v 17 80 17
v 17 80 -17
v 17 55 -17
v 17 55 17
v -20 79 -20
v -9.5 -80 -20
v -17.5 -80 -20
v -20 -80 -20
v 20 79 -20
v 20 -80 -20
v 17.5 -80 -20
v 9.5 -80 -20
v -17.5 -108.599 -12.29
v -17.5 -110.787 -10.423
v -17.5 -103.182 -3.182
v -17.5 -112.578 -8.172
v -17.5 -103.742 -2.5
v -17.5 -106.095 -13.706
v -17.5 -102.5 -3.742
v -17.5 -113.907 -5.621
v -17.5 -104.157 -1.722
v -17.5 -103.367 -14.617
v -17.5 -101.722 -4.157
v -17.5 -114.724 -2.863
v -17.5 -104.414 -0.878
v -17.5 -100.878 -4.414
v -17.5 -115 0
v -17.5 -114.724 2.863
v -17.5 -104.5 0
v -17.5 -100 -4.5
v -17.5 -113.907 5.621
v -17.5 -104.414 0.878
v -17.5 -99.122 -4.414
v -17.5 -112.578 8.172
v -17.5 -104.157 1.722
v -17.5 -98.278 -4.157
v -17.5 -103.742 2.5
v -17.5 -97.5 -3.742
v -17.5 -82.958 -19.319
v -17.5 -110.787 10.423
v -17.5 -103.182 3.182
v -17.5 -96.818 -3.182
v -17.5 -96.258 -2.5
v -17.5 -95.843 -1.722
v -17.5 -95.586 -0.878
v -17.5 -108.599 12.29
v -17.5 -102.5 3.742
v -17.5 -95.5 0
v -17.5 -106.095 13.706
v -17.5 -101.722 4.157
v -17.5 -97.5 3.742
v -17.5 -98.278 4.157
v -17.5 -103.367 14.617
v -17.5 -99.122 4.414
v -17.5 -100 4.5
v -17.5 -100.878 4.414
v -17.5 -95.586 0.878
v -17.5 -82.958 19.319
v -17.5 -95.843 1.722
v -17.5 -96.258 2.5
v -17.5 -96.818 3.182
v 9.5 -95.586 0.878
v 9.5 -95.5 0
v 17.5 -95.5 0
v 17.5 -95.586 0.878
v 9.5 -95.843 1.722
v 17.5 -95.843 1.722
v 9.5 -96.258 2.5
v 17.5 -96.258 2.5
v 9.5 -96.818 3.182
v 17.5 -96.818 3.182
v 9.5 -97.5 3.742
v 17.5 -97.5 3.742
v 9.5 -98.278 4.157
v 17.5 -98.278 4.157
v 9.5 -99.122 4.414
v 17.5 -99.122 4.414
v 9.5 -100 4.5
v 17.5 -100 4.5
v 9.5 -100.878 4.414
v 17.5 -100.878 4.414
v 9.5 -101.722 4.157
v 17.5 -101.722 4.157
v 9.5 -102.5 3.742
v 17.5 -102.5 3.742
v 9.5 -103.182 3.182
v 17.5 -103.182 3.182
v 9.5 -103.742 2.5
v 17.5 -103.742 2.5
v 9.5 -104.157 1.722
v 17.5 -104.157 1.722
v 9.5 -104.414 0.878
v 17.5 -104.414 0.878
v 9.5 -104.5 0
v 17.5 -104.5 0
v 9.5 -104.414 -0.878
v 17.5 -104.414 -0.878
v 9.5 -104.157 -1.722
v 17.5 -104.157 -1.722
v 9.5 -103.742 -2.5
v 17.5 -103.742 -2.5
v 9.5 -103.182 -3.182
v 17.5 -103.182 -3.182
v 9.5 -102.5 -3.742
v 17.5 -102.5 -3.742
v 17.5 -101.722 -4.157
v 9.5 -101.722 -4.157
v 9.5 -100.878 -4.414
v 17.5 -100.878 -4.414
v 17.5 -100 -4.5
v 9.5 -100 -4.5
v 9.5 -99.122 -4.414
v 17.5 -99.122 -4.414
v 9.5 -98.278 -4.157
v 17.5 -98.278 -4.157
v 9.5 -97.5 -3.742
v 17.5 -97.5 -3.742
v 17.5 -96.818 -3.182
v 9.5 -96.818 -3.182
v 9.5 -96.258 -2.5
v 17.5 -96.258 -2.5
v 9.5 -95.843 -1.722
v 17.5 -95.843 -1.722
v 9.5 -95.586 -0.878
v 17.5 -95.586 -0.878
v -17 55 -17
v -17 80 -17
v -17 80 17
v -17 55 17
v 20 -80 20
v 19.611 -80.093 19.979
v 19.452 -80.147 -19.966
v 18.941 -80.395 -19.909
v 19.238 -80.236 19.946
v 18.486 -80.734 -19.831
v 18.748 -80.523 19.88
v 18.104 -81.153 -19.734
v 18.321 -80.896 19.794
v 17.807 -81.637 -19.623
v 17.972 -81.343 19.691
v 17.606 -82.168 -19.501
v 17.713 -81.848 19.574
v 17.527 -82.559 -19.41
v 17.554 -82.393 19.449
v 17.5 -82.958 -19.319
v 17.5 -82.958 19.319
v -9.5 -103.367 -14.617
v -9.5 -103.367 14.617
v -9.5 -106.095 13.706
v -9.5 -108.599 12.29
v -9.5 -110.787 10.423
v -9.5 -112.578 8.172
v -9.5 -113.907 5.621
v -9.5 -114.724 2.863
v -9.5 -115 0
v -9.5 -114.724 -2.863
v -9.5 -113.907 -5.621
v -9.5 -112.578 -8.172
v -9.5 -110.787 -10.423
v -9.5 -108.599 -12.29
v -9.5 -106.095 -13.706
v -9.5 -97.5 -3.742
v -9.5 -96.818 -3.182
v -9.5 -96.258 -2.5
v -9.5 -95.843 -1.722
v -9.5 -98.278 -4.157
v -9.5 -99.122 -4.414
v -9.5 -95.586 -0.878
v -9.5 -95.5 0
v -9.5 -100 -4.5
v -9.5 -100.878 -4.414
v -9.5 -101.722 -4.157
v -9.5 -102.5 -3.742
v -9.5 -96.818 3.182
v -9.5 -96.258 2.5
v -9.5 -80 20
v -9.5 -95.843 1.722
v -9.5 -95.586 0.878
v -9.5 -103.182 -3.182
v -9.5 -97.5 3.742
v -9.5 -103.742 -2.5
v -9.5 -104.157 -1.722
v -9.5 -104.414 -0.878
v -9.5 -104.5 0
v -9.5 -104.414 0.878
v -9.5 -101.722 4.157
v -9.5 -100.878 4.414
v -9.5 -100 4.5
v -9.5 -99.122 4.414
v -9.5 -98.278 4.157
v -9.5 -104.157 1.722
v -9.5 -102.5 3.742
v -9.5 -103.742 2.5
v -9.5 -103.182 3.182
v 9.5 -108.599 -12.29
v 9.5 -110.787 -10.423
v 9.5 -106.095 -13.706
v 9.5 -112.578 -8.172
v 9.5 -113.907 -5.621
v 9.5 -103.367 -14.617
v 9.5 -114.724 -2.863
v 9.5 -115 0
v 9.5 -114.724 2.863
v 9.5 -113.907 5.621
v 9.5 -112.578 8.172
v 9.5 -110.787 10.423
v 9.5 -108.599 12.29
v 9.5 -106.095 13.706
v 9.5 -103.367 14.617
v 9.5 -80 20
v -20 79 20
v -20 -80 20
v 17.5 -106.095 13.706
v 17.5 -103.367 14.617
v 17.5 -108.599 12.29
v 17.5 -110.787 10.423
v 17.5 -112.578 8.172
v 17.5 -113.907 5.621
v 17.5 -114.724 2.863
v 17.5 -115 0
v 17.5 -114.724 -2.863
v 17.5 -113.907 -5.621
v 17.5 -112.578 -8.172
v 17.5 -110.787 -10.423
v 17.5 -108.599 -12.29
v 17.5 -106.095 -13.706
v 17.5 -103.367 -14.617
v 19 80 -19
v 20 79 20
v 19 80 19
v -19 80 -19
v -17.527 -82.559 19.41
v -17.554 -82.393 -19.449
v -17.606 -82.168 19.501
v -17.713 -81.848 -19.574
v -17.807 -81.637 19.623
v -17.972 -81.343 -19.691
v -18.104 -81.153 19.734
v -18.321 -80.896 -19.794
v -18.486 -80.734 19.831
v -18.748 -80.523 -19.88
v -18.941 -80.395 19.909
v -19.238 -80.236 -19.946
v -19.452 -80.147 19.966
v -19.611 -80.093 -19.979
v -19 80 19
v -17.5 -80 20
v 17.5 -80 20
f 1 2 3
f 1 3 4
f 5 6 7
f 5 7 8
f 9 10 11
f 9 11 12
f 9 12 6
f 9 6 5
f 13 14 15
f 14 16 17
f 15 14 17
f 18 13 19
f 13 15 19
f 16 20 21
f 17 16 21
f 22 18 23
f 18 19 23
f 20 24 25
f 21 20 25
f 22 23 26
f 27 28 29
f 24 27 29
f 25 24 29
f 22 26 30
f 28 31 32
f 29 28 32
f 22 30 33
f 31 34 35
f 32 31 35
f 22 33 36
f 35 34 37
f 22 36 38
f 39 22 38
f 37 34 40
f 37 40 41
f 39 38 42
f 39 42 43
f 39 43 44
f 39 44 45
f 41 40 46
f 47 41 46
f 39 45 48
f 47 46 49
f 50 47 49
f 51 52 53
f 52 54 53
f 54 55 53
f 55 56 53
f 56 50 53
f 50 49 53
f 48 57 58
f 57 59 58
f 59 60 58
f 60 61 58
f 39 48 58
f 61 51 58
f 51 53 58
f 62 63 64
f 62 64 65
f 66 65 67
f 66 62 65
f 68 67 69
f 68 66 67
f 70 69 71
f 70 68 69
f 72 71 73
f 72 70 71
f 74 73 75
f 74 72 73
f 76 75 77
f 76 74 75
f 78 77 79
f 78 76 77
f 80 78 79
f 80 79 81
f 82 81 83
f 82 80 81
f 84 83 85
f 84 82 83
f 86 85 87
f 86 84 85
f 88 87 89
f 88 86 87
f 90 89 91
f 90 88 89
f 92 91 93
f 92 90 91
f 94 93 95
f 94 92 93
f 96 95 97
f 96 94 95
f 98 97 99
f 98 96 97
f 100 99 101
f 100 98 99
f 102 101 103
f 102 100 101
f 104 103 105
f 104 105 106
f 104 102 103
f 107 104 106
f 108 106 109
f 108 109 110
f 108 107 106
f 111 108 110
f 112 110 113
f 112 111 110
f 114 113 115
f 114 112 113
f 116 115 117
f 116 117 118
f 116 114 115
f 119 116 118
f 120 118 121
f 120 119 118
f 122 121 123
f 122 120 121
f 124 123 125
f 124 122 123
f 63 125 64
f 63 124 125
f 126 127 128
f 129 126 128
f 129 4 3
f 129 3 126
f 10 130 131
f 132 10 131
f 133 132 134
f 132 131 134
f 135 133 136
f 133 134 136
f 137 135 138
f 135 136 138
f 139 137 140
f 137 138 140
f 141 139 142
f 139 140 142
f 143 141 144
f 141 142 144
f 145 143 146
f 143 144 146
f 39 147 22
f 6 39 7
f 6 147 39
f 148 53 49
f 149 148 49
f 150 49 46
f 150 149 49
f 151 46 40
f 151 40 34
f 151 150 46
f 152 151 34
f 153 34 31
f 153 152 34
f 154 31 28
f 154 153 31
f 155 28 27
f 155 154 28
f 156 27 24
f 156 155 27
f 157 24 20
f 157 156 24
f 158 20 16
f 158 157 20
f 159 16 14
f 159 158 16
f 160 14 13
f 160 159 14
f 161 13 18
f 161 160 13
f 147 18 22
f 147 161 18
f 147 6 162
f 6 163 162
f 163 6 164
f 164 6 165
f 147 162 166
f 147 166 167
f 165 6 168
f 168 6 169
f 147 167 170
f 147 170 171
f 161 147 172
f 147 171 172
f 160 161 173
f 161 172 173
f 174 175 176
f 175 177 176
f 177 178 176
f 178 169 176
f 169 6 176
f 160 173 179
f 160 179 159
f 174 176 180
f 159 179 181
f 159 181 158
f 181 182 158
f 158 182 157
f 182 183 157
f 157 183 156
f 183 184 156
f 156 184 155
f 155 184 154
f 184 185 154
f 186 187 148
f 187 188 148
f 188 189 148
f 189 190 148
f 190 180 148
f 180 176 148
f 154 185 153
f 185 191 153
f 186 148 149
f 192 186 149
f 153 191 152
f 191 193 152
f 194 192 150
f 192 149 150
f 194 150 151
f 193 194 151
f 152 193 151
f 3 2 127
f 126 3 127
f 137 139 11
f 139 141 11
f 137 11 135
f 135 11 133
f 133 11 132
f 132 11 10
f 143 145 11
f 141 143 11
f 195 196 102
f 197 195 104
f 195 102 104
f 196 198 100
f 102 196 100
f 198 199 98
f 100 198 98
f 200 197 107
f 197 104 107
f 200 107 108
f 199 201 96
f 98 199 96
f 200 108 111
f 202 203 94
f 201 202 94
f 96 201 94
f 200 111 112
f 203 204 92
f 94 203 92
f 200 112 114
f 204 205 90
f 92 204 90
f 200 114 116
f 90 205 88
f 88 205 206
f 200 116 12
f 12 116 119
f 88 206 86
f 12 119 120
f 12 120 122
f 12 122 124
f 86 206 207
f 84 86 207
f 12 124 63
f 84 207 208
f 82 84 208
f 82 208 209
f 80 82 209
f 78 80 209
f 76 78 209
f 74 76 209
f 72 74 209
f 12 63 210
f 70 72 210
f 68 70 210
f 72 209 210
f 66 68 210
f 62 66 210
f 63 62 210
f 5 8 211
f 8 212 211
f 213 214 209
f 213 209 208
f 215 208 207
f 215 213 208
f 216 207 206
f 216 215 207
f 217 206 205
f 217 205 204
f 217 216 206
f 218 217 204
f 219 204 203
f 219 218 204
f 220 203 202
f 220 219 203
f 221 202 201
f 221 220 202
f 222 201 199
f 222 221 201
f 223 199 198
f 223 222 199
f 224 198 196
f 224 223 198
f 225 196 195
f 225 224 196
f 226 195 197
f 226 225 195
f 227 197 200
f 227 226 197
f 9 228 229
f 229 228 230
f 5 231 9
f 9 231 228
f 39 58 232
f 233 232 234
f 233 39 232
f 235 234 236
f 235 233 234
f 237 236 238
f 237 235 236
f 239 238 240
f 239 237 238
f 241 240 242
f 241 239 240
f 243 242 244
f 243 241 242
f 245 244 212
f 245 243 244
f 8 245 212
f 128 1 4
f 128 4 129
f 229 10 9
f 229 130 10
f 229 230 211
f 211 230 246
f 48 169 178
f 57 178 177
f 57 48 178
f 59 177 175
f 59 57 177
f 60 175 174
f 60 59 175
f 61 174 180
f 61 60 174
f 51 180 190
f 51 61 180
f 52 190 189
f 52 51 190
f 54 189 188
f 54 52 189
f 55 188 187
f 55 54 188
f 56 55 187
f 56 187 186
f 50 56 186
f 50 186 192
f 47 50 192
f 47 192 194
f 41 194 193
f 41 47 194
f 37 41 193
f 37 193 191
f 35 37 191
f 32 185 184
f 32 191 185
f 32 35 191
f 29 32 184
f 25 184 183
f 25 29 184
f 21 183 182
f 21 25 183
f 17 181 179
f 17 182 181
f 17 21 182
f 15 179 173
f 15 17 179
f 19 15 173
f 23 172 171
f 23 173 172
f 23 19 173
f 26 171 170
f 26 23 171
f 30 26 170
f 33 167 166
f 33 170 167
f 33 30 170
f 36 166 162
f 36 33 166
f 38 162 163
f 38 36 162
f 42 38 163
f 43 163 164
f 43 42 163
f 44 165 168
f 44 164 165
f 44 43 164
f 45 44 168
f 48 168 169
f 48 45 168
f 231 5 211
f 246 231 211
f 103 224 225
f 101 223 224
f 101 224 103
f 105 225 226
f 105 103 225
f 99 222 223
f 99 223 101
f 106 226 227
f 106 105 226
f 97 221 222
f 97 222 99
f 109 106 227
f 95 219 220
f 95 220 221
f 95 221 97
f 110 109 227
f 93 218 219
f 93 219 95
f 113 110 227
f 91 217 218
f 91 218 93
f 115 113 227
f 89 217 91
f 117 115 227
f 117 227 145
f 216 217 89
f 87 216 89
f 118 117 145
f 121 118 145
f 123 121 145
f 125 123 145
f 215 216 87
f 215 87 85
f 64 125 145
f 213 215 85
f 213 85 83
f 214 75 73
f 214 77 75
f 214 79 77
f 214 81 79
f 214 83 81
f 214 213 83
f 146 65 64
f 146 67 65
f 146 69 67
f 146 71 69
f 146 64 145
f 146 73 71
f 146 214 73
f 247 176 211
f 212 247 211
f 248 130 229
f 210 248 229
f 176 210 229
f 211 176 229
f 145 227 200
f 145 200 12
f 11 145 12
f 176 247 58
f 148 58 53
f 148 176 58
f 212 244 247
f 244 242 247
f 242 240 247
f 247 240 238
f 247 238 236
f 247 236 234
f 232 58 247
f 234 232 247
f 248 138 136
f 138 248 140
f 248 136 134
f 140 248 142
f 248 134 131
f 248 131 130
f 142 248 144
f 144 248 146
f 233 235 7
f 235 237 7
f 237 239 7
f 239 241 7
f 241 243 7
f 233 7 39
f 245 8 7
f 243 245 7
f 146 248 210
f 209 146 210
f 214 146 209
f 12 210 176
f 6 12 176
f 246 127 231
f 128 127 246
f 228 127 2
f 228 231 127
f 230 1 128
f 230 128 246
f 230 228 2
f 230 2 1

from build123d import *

# Parameters (mm, degrees)
F0_W         = 160
F0_H         = 40
F1_DEPTH     = 20
F2_W         = 34
F2_H         = 34
F3_DEPTH     = 25
F4_R         = 4.5
F5_DEPTH     = 17.5
F7_DEPTH     = 25
F8_T4_DEPTH  = 54.7901994578
F8_T10_DEPTH = 54.7901994578
F9_SIZE      = 1


# Not quite as in the source:
# - a fillet or chamfer that OpenCascade refuses, or shapes differently, is made with other operations: its cross-section is extruded or revolved along the edge and cut away or added


with BuildPart() as f1:
    # F0 (on Right) → F1 (new body, symmetric)
    with BuildSketch(Plane.YZ):
        Rectangle(F0_W, F0_H)
    extrude(amount=F1_DEPTH, both=True)

    # F2 (on face) → F3 (cut)
    with BuildSketch(Plane(origin=(0, 80, 0), x_dir=(-1, 0, 0), z_dir=(0, 1, 0))):
        Rectangle(F2_W, F2_H)
    extrude(amount=-F3_DEPTH, mode=Mode.SUBTRACT)

    # F4 (on Right) → F5 (join, symmetric)
    with BuildSketch(Plane.YZ):
        with BuildLine():
            Line((-80, 20), (-103.3671841062, 14.6171841062))
            ThreePointArc((-103.3671841062, 14.6171841062), (-115, 0), (-103.3671841062, -14.6171841062))
            Line((-103.3671841062, -14.6171841062), (-80, -20))
            Line((-80, -20), (-80, 0))
            Line((-80, 0), (-80, 20))
        make_face()
        with Locations((-100, 0)):
            Circle(F4_R, mode=Mode.SUBTRACT)
    extrude(amount=F5_DEPTH, both=True)

    # F6 (on Top) → F7 (cut, symmetric)
    with BuildSketch(Plane.XY):
        Polygon((-9.5, -115), (0, -115), (9.5, -115), (9.5, -80), (-9.5, -80), align=None)
    extrude(amount=F7_DEPTH, both=True, mode=Mode.SUBTRACT)

    # F8: fillet of radius 3 on 2 edges, made by hand


with BuildPart() as f8_tool2:
    # F8_s3 → F8_t4 (new body)
    with BuildSketch(Plane.XY.offset(-27.3950997289)):
        with BuildLine():
            ThreePointArc((-17.5, -82.9580398916), (-18.2087121525, -81.0215482184), (-20, -80))
            Line((-20, -80), (-17.5, -80))
            Line((-17.5, -80), (-17.5, -82.9580398916))
        make_face()
    extrude(amount=F8_T4_DEPTH)

    split(bisect_by=Plane(origin=(0, -8.4062635752, 36.4921841062), x_dir=(1, 0, 0), z_dir=(0, 0.2244789404, -0.9744789404)), keep=Keep.TOP)

    split(bisect_by=Plane(origin=(0, -8.4062635752, -36.4921841062), x_dir=(1, 0, 0), z_dir=(0, 0.2244789404, 0.9744789404)), keep=Keep.TOP)


with BuildPart() as f1_1:
    add(f1.part)

    # F8_t1: union F8_tool2
    add(f8_tool2.part)


with BuildPart() as f8_tool8:
    # F8_s9 → F8_t10 (new body)
    with BuildSketch(Plane.XY.offset(27.3950997289)):
        with BuildLine():
            ThreePointArc((20, -80), (18.2087121525, -81.0215482184), (17.5, -82.9580398916))
            Line((17.5, -82.9580398916), (17.5, -80))
            Line((17.5, -80), (20, -80))
        make_face()
    extrude(amount=-F8_T10_DEPTH)

    split(bisect_by=Plane(origin=(0, -8.4062635752, -36.4921841062), x_dir=(1, 0, 0), z_dir=(0, 0.2244789404, 0.9744789404)), keep=Keep.TOP)

    split(bisect_by=Plane(origin=(0, -8.4062635752, 36.4921841062), x_dir=(1, 0, 0), z_dir=(0, 0.2244789404, -0.9744789404)), keep=Keep.TOP)


with BuildPart() as f1_2:
    add(f1_1.part)

    # F8_t7: union F8_tool8
    add(f8_tool8.part)

    # F9
    f9_edges = [f1_2.edges().sort_by_distance(p)[0] for p in [
        (0, 80, 20),
        (-20, 80, 0),
        (0, 80, -20),
        (20, 80, 0),
    ]]
    chamfer(f9_edges, length=F9_SIZE)


solid = f1_2.part
